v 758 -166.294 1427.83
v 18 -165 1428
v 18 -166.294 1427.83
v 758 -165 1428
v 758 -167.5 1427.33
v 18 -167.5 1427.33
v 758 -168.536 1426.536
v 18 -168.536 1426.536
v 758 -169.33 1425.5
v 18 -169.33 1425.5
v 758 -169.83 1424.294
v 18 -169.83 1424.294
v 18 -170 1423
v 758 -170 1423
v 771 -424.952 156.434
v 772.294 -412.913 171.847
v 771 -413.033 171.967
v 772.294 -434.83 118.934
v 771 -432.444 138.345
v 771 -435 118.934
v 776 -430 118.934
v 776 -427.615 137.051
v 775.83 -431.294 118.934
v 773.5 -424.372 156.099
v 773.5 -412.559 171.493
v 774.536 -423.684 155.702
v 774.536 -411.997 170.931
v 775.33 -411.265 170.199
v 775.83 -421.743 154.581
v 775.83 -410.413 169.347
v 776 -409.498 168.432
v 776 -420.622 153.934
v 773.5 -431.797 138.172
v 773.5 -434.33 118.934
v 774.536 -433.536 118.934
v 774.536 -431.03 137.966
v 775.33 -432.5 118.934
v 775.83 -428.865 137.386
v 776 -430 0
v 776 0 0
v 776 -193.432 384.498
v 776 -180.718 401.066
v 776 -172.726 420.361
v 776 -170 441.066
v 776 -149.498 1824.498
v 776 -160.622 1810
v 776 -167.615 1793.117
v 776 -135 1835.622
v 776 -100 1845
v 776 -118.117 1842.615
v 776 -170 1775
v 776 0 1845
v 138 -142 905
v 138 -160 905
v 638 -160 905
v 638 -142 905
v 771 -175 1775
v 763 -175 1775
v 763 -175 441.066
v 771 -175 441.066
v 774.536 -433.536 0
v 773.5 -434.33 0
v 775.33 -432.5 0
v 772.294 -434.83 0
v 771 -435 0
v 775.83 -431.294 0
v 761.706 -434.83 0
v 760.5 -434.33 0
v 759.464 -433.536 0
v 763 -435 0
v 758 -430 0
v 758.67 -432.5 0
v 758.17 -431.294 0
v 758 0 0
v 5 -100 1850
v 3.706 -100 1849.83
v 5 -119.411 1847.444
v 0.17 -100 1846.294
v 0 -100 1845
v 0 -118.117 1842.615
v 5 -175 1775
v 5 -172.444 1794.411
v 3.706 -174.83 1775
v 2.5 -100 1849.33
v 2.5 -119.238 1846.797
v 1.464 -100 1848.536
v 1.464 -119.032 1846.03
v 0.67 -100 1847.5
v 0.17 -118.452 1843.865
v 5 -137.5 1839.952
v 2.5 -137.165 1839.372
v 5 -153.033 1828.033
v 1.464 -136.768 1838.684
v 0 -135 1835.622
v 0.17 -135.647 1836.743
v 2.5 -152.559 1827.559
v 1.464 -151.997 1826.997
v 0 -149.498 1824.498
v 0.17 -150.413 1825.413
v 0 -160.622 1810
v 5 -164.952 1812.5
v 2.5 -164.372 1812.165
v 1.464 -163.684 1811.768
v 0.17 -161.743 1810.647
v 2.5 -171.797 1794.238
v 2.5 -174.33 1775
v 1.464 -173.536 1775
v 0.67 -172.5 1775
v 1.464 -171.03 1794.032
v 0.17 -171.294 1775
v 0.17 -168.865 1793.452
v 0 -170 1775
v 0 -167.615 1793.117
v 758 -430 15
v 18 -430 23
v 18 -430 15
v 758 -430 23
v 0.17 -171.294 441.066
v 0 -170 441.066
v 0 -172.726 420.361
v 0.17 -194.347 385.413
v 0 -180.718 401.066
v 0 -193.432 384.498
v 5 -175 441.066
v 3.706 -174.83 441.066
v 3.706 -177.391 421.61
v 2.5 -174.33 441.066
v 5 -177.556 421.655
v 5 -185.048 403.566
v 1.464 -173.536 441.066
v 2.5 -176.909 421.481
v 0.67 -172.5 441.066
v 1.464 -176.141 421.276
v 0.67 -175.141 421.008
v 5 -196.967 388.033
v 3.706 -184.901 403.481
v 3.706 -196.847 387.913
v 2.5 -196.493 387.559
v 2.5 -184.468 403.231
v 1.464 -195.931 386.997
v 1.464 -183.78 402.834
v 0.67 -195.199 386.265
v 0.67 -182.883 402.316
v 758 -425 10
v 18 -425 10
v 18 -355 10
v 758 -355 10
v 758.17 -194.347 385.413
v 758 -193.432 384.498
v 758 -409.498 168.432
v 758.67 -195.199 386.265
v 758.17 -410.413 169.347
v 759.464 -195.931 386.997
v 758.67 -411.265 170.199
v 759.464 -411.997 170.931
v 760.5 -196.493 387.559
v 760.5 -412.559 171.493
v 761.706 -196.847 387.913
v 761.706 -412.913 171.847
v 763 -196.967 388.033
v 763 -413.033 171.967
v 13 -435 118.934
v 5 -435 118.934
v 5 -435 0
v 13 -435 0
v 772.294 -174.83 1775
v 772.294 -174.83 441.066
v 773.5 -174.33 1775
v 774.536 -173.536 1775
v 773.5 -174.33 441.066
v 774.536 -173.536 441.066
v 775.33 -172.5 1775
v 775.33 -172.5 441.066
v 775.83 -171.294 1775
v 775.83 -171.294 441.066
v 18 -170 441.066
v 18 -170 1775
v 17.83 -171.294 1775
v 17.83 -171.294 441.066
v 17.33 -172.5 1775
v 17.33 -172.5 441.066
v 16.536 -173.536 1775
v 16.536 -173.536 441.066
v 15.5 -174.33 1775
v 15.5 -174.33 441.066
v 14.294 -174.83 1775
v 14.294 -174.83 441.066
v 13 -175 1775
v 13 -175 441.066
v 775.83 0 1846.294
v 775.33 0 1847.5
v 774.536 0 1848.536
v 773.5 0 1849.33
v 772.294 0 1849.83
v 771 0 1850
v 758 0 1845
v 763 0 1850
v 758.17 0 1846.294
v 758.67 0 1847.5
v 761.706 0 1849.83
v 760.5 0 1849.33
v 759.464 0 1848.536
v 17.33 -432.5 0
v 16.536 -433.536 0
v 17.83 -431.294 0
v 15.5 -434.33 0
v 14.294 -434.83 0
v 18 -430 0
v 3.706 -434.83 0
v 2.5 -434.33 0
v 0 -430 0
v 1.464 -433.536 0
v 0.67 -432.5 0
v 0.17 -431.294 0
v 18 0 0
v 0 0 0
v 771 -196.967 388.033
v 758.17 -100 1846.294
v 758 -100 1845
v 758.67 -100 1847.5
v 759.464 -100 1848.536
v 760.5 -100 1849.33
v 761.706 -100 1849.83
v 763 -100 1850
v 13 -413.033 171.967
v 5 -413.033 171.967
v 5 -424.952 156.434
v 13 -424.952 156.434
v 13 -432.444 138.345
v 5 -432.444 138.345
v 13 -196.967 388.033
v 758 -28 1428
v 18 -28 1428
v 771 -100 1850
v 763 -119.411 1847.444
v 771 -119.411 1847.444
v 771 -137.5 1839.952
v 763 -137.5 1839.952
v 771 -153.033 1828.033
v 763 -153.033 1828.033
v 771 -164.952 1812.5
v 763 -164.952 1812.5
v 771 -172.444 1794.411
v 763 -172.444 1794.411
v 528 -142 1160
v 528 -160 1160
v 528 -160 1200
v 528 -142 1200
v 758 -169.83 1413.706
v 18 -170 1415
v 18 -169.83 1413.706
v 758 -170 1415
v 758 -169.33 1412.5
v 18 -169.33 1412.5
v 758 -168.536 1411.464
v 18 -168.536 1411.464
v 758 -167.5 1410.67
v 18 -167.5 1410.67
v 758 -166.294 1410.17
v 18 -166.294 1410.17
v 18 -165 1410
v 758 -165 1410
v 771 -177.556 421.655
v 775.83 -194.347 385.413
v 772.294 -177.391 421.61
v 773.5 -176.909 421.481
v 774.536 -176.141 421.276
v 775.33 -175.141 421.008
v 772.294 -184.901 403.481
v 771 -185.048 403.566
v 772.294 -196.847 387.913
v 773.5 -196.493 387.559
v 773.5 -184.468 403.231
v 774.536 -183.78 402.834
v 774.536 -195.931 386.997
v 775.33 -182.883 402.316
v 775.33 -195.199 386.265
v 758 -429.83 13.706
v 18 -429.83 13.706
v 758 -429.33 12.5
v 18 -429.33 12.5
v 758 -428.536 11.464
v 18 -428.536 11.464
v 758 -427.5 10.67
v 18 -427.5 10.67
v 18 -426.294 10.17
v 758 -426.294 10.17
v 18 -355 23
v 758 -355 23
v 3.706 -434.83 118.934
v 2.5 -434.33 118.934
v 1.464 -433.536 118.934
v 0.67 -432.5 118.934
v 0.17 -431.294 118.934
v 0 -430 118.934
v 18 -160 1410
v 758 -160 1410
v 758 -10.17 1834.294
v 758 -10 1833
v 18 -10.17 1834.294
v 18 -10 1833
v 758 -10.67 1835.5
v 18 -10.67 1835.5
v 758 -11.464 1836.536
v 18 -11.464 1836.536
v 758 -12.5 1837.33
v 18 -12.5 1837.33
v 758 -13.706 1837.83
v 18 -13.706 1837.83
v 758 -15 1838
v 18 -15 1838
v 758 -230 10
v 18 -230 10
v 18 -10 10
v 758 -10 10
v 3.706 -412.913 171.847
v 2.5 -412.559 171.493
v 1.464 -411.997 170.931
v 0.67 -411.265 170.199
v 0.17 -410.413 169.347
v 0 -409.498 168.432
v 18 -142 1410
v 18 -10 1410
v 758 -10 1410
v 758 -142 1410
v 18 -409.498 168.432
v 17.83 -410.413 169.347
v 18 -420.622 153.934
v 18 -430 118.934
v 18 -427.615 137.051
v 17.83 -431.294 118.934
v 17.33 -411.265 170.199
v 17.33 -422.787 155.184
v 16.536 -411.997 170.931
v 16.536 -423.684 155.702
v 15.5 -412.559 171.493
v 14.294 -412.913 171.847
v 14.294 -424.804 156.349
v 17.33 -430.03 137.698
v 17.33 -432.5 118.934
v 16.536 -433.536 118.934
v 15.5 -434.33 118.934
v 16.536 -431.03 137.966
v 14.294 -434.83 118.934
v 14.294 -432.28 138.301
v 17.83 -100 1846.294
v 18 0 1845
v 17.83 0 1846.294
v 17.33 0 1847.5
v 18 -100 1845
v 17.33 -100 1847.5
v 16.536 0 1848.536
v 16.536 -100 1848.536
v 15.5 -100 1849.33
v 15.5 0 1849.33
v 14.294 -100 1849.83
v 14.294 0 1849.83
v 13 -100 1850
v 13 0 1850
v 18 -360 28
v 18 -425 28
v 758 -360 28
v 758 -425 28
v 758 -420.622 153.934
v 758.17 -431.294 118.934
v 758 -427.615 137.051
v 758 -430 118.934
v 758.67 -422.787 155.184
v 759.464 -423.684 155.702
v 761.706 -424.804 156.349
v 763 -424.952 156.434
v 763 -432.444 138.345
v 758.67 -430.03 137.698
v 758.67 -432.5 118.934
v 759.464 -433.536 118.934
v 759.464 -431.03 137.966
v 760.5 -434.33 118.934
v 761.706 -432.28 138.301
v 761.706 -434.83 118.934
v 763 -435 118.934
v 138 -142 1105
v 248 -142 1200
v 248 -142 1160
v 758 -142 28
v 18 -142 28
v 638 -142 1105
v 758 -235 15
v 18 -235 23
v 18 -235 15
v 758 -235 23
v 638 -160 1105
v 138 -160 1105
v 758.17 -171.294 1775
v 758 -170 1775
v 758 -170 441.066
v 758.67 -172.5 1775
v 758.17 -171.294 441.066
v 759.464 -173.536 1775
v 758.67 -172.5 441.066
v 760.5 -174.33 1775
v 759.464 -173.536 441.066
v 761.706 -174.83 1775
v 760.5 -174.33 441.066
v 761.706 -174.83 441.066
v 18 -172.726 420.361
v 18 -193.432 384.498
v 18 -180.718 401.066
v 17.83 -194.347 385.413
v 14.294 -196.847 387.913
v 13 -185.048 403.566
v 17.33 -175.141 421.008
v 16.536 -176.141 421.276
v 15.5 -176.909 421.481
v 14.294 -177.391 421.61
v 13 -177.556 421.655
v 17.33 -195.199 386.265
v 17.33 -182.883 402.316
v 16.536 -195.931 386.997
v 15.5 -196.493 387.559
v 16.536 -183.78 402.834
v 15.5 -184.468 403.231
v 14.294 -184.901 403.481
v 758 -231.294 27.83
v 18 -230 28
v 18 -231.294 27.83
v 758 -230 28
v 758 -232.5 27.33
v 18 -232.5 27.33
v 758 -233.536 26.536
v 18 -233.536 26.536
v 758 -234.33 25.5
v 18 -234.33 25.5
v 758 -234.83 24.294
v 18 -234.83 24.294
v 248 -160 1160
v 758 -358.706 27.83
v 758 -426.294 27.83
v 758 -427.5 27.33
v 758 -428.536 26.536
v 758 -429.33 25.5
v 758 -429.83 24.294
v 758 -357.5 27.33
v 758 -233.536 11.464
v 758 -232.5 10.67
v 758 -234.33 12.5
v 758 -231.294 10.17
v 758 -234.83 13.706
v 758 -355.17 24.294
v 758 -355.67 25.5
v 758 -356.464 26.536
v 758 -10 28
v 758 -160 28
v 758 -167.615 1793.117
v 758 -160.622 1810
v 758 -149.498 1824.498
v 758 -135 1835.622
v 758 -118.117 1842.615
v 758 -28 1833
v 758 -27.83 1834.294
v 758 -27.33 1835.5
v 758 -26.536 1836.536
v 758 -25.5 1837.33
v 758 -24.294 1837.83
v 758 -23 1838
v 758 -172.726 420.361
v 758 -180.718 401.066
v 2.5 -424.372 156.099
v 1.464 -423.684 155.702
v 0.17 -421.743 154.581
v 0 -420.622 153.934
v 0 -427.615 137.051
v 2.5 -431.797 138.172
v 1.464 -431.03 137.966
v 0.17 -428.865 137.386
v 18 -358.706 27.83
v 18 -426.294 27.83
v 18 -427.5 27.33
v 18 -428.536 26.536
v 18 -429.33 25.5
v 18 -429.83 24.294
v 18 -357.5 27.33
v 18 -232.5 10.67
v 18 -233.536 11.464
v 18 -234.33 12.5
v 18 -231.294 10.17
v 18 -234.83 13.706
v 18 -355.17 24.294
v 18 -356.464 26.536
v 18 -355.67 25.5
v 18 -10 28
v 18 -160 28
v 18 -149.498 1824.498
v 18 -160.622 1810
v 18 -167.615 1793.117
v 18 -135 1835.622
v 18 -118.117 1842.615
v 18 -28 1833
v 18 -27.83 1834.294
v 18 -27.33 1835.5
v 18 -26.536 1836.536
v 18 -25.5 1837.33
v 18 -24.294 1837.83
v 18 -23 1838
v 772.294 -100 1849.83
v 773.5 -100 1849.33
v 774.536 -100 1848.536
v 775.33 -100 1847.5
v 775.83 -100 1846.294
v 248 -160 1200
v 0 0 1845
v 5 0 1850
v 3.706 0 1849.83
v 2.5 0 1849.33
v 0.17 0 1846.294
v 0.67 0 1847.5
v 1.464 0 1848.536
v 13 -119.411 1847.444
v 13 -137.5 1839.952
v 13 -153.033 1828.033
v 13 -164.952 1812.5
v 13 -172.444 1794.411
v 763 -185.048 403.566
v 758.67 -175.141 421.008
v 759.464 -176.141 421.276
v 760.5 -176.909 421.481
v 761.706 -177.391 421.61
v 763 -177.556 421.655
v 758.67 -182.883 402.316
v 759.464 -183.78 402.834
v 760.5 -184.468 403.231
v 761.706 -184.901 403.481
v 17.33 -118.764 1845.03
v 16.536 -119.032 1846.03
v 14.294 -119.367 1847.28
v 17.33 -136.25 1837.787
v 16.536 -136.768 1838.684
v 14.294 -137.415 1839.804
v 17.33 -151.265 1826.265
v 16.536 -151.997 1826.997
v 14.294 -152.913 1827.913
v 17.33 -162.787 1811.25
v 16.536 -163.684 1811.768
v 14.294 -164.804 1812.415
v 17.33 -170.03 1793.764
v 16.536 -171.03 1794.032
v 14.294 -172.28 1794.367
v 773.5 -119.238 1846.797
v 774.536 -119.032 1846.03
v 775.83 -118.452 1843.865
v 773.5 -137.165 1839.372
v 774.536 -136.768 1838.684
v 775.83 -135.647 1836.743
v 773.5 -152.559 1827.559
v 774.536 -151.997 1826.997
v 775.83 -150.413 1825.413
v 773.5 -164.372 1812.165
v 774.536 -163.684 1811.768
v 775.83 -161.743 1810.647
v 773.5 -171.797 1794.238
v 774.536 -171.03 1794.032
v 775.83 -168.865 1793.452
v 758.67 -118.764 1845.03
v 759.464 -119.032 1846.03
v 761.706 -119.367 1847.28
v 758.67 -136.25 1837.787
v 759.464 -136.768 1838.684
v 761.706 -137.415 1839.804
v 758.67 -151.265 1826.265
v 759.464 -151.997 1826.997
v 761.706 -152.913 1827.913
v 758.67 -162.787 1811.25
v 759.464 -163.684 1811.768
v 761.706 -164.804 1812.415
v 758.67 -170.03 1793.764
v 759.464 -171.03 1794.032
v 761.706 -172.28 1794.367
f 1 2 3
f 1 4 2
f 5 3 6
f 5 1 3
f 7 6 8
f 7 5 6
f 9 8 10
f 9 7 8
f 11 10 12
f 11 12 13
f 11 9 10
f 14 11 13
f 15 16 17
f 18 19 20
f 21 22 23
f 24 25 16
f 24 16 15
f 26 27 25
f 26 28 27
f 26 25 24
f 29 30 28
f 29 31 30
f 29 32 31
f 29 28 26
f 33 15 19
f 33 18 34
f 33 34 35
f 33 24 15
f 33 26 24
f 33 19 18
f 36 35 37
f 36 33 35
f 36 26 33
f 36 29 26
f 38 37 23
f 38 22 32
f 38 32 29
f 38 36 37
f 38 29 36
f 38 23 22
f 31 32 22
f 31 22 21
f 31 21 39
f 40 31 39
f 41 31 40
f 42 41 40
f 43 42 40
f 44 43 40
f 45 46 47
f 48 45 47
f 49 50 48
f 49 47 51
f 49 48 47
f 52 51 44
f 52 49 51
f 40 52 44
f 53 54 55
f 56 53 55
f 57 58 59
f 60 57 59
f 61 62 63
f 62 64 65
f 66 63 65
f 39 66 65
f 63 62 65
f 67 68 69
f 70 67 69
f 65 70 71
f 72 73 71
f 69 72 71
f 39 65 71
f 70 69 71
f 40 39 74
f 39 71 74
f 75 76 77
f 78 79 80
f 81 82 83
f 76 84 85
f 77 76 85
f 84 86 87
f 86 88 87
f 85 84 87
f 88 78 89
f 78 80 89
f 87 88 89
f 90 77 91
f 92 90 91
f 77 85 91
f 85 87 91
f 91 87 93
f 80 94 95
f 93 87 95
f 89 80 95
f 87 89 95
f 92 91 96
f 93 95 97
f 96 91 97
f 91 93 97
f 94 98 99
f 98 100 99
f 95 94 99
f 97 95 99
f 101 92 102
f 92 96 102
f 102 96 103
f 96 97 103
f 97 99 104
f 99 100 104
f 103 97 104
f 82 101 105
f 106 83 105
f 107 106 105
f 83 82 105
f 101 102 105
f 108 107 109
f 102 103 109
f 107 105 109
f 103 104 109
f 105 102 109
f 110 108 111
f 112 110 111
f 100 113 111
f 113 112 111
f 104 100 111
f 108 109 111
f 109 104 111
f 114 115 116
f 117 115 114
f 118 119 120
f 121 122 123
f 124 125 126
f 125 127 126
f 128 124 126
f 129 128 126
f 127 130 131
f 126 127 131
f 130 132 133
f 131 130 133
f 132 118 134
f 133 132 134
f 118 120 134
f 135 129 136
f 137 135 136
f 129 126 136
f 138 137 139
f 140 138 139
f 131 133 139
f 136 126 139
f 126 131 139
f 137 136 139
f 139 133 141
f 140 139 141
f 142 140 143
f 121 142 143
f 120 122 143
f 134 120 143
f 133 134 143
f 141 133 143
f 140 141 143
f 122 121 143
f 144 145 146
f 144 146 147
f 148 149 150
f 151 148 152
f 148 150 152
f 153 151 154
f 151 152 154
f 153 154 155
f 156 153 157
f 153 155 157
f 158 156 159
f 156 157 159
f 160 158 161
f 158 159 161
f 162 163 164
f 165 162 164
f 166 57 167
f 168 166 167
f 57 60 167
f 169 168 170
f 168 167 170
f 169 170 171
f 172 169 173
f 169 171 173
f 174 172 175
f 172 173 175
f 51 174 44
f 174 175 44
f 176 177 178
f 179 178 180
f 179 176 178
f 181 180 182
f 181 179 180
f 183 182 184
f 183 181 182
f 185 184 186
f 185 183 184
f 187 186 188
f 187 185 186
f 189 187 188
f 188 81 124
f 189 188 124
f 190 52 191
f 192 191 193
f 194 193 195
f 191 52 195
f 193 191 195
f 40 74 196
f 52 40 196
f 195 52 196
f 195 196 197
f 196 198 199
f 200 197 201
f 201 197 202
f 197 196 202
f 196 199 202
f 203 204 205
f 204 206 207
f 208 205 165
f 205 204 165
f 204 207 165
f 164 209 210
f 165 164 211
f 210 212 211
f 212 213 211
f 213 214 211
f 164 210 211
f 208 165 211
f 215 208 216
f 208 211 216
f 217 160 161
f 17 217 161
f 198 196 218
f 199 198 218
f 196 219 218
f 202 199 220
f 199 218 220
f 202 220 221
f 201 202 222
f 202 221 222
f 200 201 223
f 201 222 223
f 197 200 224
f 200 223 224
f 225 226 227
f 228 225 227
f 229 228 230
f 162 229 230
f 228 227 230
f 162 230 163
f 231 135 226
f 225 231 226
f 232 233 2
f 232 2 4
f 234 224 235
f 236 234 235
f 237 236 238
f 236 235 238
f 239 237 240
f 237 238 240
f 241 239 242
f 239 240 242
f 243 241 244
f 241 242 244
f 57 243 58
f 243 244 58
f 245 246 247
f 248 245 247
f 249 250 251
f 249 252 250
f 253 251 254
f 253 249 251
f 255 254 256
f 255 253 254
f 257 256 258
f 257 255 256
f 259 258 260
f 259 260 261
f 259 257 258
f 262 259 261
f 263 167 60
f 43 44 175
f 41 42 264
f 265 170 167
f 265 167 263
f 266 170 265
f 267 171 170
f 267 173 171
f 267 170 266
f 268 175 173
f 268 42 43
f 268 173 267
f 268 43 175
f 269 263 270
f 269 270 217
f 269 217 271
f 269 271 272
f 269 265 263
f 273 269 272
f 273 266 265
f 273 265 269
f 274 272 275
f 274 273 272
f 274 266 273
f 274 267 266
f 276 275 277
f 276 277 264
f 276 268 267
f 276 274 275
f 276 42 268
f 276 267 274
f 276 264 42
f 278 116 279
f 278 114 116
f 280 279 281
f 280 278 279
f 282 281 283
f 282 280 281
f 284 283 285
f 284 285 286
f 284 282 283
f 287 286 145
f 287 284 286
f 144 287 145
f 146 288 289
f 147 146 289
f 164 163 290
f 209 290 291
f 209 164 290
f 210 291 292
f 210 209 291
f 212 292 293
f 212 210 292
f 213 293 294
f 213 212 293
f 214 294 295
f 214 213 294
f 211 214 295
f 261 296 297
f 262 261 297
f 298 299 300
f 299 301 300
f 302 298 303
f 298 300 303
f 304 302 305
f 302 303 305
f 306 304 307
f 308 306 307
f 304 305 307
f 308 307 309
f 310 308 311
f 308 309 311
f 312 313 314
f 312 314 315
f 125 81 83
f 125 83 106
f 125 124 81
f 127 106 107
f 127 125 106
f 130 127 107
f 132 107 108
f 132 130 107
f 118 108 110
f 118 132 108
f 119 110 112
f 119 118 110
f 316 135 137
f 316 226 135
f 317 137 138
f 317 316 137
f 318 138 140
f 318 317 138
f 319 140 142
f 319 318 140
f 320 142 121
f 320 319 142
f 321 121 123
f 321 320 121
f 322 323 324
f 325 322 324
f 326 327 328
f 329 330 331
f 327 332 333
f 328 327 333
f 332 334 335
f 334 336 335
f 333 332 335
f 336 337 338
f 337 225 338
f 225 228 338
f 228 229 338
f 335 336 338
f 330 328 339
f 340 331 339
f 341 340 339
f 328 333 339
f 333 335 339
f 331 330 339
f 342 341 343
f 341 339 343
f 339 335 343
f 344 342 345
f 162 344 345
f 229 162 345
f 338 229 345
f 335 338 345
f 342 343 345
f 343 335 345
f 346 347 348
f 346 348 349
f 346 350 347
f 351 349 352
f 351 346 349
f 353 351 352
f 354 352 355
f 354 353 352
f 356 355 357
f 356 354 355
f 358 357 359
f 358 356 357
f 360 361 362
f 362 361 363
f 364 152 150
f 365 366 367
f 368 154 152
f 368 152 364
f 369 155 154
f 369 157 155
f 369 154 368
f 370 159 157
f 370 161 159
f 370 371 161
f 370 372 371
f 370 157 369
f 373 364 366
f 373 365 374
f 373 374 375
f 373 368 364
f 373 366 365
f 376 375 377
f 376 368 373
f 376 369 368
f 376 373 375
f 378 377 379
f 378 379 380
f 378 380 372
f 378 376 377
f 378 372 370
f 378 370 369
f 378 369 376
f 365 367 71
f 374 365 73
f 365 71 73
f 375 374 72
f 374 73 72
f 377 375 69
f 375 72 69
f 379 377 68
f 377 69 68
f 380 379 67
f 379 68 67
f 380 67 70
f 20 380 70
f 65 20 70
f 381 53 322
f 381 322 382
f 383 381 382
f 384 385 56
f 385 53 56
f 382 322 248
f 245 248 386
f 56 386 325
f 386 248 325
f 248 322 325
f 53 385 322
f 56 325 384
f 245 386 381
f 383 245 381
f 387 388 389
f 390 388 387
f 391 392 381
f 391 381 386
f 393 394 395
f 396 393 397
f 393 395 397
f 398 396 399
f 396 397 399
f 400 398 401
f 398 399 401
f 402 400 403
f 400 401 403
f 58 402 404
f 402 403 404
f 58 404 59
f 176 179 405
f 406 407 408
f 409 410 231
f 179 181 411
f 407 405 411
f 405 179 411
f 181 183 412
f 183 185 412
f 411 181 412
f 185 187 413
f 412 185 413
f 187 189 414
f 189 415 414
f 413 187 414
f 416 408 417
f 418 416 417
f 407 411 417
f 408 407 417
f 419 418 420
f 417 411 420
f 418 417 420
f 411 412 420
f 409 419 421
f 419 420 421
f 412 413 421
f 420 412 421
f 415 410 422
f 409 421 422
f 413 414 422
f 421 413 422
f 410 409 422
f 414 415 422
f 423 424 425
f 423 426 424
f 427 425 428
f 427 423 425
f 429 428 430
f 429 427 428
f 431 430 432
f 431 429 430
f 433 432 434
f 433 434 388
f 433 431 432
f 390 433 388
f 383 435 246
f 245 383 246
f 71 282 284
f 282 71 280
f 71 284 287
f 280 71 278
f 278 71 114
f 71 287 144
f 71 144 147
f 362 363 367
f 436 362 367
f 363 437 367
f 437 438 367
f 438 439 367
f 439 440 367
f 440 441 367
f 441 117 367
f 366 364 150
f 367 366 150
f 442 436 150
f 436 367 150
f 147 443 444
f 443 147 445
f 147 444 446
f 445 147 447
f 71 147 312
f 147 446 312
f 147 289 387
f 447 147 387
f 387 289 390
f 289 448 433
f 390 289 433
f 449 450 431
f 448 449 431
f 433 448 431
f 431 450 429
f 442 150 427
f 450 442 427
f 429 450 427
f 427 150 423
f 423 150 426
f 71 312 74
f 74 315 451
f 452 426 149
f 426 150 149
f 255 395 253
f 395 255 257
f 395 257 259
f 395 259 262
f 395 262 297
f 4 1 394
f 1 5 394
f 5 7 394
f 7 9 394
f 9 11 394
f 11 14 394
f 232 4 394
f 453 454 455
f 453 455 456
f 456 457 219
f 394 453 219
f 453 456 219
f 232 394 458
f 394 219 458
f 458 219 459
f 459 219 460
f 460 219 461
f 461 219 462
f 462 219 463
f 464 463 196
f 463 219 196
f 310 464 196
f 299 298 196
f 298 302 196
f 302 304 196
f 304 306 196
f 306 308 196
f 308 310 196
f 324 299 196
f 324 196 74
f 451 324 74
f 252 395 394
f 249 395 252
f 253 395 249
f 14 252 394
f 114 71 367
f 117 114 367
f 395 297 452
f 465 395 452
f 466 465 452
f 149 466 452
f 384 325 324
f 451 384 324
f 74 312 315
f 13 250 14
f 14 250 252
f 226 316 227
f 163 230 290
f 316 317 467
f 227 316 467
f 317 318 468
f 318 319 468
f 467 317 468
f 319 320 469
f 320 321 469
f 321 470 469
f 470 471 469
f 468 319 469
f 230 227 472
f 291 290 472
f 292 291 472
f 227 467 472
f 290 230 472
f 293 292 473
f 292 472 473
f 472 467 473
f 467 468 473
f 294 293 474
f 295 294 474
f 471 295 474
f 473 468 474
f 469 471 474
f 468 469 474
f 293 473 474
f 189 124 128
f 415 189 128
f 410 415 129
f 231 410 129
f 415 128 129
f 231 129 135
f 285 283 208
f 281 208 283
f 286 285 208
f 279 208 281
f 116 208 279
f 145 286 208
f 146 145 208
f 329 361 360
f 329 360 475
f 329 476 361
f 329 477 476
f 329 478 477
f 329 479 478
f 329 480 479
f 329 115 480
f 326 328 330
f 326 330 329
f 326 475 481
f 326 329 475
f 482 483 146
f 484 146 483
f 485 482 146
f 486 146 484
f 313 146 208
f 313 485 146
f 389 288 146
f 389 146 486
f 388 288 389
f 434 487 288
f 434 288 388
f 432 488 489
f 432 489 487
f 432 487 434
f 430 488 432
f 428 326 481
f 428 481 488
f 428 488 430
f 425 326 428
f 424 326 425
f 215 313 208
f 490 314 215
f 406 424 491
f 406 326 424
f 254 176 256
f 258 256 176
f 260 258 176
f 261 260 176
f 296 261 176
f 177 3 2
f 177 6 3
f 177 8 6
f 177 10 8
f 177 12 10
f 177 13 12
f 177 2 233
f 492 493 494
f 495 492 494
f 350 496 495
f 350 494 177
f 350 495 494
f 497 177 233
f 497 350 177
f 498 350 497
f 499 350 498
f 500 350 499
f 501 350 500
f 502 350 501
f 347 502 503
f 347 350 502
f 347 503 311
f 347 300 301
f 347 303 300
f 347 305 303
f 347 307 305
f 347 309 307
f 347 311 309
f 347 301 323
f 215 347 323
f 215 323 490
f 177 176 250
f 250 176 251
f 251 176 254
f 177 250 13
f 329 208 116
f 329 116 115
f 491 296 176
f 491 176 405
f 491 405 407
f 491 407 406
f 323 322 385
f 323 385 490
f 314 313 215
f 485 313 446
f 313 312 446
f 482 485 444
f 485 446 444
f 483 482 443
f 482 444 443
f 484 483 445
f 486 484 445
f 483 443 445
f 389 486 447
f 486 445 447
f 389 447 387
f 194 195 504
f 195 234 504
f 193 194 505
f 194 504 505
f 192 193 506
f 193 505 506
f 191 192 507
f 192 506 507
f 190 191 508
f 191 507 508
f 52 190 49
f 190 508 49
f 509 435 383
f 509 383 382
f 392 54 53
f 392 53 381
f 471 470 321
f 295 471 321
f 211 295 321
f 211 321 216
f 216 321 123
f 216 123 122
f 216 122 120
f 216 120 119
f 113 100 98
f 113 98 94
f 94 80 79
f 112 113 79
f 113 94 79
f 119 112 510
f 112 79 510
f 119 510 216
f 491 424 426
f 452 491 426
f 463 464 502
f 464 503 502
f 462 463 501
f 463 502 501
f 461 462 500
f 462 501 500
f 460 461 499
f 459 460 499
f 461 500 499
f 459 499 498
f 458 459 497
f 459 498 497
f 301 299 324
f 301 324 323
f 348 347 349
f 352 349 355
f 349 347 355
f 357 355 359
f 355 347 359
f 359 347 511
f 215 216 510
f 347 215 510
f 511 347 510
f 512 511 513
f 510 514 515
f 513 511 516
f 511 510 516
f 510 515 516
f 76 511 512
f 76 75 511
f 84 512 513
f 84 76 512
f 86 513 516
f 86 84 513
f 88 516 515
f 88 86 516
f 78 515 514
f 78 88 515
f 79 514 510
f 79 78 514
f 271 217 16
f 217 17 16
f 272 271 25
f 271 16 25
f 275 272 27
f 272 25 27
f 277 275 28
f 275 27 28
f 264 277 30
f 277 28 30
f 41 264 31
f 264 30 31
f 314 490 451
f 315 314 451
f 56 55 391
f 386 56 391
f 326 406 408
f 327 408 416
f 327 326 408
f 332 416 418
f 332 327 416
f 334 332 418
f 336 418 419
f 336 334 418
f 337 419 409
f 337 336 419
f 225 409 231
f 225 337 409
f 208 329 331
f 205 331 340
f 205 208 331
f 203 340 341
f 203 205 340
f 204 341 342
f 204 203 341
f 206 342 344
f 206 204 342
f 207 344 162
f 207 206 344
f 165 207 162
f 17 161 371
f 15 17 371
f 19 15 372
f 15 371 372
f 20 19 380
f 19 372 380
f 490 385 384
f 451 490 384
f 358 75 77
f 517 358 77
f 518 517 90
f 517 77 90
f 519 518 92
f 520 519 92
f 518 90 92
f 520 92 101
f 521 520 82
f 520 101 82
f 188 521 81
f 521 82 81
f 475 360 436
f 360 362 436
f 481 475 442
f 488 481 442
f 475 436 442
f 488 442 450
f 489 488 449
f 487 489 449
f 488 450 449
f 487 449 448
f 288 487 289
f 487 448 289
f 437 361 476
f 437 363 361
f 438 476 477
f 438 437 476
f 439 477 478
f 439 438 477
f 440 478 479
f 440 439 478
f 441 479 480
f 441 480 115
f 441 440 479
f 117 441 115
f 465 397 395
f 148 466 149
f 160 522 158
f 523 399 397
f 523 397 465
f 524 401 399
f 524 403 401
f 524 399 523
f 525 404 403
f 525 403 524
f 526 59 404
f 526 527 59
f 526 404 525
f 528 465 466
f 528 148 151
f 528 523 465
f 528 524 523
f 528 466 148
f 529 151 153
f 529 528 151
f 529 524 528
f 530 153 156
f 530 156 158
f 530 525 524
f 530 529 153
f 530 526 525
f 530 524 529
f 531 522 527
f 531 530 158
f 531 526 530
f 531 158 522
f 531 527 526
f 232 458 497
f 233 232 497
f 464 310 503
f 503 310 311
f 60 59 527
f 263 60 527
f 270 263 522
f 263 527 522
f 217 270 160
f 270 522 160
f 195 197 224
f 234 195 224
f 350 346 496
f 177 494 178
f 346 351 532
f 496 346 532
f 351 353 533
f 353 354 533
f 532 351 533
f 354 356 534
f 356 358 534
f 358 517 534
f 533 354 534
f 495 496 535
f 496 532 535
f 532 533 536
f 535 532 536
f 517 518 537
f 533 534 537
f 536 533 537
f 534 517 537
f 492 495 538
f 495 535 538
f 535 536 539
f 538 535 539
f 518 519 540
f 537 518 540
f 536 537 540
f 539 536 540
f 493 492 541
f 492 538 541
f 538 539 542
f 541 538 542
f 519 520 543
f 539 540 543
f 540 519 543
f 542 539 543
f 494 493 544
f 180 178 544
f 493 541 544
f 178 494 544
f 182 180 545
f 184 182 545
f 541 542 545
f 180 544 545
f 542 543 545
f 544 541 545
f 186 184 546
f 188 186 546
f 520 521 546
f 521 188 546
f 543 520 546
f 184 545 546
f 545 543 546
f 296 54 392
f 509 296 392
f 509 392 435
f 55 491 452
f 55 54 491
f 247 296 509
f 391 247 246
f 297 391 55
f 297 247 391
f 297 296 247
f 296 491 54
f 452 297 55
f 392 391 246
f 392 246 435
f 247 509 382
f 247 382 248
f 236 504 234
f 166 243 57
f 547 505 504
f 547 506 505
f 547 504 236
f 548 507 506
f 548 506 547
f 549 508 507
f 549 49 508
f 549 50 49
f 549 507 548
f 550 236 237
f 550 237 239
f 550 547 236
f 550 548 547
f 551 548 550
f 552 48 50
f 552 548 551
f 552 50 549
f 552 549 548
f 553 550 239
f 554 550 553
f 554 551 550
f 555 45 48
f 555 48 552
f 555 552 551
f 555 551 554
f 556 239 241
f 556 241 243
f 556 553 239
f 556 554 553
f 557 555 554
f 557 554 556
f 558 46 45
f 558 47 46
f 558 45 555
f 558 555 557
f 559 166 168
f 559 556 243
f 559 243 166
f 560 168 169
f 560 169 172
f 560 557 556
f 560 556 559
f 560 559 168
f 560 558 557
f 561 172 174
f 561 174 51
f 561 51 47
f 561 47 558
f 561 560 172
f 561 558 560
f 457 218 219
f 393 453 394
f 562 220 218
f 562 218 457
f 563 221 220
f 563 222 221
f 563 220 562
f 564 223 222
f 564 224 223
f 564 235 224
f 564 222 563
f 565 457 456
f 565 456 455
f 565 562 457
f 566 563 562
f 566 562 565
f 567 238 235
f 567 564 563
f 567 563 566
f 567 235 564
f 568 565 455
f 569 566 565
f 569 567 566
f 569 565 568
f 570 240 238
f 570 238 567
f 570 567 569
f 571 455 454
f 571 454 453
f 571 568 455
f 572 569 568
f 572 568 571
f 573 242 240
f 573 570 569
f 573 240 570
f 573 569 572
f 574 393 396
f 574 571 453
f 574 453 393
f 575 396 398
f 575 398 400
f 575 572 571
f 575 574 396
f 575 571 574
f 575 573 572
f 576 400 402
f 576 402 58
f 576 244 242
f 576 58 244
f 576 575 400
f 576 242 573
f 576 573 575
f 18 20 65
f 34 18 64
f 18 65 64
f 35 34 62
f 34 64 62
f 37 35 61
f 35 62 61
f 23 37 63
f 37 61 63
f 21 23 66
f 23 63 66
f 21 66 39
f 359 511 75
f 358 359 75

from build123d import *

# Parameters (mm, degrees)
F1_DEPTH  = 18
F3_W      = 740
F3_H      = 1382
F3_W_2    = 500
F3_H_2    = 200
F3_W_3    = 280
F3_H_3    = 40
F4_DEPTH  = 18
F7_DEPTH  = 18
F9_W      = 740
F9_H      = 160
F10_DEPTH = 18
F12_W     = 740
F12_H     = 410
F13_DEPTH = 18
F15_W     = 740
F15_H     = 225
F15_H_2   = 75
F16_DEPTH = 18
F17_R     = 4.9999


# Not quite as in the source:
# - a fillet or chamfer is up to 0.001 mm smaller than in the source, because OpenCascade refuses the exact size


with BuildPart() as f1:
    # F0 (on Right) → F1 (new body)
    with BuildSketch(Plane.YZ):
        with BuildLine():
            Line((-435, 0), (0, 0))
            Line((0, 0), (0, 1850))
            Line((0, 1850), (-100, 1850))
            ThreePointArc((-100, 1850), (-153.033008589, 1828.033008589), (-175, 1775))
            Line((-175, 1775), (-175, 441.066017178))
            ThreePointArc((-175, 441.066017178), (-180.7090350617, 412.3647597506), (-196.966991411, 388.033008589))
            Line((-196.966991411, 388.033008589), (-413.033008589, 171.966991411))
            ThreePointArc((-413.033008589, 171.966991411), (-429.2909649383, 147.6352402494), (-435, 118.933982822))
            Line((-435, 118.933982822), (-435, 0))
        make_face()
    extrude(amount=F1_DEPTH)

    # F3 (on offset) → F4 (join)
    with BuildSketch(Plane.XZ.offset(160)):
        with Locations((388, 719)):
            Rectangle(F3_W, F3_H)
        with Locations((388, 1005)):
            Rectangle(F3_W_2, F3_H_2, mode=Mode.SUBTRACT)
        with Locations((388, 1180)):
            Rectangle(F3_W_3, F3_H_3, mode=Mode.SUBTRACT)
    extrude(amount=-F4_DEPTH)

    # F6 (on offset) → F7 (join)
    with BuildSketch(Plane.YZ.offset(758)):
        with BuildLine():
            Line((-435, 0), (0, 0))
            Line((0, 0), (0, 1850))
            Line((0, 1850), (-100, 1850))
            ThreePointArc((-100, 1850), (-153.033008589, 1828.033008589), (-175, 1775))
            Line((-175, 1775), (-175, 441.066017178))
            ThreePointArc((-175, 441.066017178), (-180.7090350617, 412.3647597506), (-196.966991411, 388.033008589))
            Line((-196.966991411, 388.033008589), (-413.033008589, 171.966991411))
            ThreePointArc((-413.033008589, 171.966991411), (-429.2909649383, 147.6352402494), (-435, 118.933982822))
            Line((-435, 118.933982822), (-435, 0))
        make_face()
    extrude(amount=F7_DEPTH)

    # F9 (on offset) → F10 (join)
    with BuildSketch(Plane.XY.offset(1410)):
        with Locations((388, -90)):
            Rectangle(F9_W, F9_H)
    extrude(amount=F10_DEPTH)

    # F12 (on offset) → F13 (join)
    with BuildSketch(Plane(origin=(0, -10, 0), x_dir=(-1, 0, 0), z_dir=(0, 1, 0))):
        with Locations((-388, 1633)):
            Rectangle(F12_W, F12_H)
    extrude(amount=-F13_DEPTH)

    # F15 (on offset) → F16 (join)
    with BuildSketch(Plane(origin=(0, 0, 28), x_dir=(1, 0, 0), z_dir=(0, 0, -1))):
        with Locations((388, 122.5)):
            Rectangle(F15_W, F15_H)
        with Locations((388, 392.5)):
            Rectangle(F15_W, F15_H_2)
    extrude(amount=F16_DEPTH)

    # F17 (radius 5 in the source; OpenCascade refuses exactly that, so slightly less here)
    f17_edges = [f1.edges().sort_by_distance(p)[0] for p in [
        (388, -170, 1428),
        (388, -170, 1410),
        (758, -175, 1108.033009),
        (776, -175, 1108.033009),
        (388, -28, 1838),
        (388, -10, 1838),
        (18, -50, 1850),
        (0, -50, 1850),
        (388, -235, 28),
        (388, -355, 28),
        (388, -430, 28),
        (388, -430, 10),
        (388, -235, 10),
    ]]
    fillet(f17_edges, radius=F17_R)


solid = f1.part
